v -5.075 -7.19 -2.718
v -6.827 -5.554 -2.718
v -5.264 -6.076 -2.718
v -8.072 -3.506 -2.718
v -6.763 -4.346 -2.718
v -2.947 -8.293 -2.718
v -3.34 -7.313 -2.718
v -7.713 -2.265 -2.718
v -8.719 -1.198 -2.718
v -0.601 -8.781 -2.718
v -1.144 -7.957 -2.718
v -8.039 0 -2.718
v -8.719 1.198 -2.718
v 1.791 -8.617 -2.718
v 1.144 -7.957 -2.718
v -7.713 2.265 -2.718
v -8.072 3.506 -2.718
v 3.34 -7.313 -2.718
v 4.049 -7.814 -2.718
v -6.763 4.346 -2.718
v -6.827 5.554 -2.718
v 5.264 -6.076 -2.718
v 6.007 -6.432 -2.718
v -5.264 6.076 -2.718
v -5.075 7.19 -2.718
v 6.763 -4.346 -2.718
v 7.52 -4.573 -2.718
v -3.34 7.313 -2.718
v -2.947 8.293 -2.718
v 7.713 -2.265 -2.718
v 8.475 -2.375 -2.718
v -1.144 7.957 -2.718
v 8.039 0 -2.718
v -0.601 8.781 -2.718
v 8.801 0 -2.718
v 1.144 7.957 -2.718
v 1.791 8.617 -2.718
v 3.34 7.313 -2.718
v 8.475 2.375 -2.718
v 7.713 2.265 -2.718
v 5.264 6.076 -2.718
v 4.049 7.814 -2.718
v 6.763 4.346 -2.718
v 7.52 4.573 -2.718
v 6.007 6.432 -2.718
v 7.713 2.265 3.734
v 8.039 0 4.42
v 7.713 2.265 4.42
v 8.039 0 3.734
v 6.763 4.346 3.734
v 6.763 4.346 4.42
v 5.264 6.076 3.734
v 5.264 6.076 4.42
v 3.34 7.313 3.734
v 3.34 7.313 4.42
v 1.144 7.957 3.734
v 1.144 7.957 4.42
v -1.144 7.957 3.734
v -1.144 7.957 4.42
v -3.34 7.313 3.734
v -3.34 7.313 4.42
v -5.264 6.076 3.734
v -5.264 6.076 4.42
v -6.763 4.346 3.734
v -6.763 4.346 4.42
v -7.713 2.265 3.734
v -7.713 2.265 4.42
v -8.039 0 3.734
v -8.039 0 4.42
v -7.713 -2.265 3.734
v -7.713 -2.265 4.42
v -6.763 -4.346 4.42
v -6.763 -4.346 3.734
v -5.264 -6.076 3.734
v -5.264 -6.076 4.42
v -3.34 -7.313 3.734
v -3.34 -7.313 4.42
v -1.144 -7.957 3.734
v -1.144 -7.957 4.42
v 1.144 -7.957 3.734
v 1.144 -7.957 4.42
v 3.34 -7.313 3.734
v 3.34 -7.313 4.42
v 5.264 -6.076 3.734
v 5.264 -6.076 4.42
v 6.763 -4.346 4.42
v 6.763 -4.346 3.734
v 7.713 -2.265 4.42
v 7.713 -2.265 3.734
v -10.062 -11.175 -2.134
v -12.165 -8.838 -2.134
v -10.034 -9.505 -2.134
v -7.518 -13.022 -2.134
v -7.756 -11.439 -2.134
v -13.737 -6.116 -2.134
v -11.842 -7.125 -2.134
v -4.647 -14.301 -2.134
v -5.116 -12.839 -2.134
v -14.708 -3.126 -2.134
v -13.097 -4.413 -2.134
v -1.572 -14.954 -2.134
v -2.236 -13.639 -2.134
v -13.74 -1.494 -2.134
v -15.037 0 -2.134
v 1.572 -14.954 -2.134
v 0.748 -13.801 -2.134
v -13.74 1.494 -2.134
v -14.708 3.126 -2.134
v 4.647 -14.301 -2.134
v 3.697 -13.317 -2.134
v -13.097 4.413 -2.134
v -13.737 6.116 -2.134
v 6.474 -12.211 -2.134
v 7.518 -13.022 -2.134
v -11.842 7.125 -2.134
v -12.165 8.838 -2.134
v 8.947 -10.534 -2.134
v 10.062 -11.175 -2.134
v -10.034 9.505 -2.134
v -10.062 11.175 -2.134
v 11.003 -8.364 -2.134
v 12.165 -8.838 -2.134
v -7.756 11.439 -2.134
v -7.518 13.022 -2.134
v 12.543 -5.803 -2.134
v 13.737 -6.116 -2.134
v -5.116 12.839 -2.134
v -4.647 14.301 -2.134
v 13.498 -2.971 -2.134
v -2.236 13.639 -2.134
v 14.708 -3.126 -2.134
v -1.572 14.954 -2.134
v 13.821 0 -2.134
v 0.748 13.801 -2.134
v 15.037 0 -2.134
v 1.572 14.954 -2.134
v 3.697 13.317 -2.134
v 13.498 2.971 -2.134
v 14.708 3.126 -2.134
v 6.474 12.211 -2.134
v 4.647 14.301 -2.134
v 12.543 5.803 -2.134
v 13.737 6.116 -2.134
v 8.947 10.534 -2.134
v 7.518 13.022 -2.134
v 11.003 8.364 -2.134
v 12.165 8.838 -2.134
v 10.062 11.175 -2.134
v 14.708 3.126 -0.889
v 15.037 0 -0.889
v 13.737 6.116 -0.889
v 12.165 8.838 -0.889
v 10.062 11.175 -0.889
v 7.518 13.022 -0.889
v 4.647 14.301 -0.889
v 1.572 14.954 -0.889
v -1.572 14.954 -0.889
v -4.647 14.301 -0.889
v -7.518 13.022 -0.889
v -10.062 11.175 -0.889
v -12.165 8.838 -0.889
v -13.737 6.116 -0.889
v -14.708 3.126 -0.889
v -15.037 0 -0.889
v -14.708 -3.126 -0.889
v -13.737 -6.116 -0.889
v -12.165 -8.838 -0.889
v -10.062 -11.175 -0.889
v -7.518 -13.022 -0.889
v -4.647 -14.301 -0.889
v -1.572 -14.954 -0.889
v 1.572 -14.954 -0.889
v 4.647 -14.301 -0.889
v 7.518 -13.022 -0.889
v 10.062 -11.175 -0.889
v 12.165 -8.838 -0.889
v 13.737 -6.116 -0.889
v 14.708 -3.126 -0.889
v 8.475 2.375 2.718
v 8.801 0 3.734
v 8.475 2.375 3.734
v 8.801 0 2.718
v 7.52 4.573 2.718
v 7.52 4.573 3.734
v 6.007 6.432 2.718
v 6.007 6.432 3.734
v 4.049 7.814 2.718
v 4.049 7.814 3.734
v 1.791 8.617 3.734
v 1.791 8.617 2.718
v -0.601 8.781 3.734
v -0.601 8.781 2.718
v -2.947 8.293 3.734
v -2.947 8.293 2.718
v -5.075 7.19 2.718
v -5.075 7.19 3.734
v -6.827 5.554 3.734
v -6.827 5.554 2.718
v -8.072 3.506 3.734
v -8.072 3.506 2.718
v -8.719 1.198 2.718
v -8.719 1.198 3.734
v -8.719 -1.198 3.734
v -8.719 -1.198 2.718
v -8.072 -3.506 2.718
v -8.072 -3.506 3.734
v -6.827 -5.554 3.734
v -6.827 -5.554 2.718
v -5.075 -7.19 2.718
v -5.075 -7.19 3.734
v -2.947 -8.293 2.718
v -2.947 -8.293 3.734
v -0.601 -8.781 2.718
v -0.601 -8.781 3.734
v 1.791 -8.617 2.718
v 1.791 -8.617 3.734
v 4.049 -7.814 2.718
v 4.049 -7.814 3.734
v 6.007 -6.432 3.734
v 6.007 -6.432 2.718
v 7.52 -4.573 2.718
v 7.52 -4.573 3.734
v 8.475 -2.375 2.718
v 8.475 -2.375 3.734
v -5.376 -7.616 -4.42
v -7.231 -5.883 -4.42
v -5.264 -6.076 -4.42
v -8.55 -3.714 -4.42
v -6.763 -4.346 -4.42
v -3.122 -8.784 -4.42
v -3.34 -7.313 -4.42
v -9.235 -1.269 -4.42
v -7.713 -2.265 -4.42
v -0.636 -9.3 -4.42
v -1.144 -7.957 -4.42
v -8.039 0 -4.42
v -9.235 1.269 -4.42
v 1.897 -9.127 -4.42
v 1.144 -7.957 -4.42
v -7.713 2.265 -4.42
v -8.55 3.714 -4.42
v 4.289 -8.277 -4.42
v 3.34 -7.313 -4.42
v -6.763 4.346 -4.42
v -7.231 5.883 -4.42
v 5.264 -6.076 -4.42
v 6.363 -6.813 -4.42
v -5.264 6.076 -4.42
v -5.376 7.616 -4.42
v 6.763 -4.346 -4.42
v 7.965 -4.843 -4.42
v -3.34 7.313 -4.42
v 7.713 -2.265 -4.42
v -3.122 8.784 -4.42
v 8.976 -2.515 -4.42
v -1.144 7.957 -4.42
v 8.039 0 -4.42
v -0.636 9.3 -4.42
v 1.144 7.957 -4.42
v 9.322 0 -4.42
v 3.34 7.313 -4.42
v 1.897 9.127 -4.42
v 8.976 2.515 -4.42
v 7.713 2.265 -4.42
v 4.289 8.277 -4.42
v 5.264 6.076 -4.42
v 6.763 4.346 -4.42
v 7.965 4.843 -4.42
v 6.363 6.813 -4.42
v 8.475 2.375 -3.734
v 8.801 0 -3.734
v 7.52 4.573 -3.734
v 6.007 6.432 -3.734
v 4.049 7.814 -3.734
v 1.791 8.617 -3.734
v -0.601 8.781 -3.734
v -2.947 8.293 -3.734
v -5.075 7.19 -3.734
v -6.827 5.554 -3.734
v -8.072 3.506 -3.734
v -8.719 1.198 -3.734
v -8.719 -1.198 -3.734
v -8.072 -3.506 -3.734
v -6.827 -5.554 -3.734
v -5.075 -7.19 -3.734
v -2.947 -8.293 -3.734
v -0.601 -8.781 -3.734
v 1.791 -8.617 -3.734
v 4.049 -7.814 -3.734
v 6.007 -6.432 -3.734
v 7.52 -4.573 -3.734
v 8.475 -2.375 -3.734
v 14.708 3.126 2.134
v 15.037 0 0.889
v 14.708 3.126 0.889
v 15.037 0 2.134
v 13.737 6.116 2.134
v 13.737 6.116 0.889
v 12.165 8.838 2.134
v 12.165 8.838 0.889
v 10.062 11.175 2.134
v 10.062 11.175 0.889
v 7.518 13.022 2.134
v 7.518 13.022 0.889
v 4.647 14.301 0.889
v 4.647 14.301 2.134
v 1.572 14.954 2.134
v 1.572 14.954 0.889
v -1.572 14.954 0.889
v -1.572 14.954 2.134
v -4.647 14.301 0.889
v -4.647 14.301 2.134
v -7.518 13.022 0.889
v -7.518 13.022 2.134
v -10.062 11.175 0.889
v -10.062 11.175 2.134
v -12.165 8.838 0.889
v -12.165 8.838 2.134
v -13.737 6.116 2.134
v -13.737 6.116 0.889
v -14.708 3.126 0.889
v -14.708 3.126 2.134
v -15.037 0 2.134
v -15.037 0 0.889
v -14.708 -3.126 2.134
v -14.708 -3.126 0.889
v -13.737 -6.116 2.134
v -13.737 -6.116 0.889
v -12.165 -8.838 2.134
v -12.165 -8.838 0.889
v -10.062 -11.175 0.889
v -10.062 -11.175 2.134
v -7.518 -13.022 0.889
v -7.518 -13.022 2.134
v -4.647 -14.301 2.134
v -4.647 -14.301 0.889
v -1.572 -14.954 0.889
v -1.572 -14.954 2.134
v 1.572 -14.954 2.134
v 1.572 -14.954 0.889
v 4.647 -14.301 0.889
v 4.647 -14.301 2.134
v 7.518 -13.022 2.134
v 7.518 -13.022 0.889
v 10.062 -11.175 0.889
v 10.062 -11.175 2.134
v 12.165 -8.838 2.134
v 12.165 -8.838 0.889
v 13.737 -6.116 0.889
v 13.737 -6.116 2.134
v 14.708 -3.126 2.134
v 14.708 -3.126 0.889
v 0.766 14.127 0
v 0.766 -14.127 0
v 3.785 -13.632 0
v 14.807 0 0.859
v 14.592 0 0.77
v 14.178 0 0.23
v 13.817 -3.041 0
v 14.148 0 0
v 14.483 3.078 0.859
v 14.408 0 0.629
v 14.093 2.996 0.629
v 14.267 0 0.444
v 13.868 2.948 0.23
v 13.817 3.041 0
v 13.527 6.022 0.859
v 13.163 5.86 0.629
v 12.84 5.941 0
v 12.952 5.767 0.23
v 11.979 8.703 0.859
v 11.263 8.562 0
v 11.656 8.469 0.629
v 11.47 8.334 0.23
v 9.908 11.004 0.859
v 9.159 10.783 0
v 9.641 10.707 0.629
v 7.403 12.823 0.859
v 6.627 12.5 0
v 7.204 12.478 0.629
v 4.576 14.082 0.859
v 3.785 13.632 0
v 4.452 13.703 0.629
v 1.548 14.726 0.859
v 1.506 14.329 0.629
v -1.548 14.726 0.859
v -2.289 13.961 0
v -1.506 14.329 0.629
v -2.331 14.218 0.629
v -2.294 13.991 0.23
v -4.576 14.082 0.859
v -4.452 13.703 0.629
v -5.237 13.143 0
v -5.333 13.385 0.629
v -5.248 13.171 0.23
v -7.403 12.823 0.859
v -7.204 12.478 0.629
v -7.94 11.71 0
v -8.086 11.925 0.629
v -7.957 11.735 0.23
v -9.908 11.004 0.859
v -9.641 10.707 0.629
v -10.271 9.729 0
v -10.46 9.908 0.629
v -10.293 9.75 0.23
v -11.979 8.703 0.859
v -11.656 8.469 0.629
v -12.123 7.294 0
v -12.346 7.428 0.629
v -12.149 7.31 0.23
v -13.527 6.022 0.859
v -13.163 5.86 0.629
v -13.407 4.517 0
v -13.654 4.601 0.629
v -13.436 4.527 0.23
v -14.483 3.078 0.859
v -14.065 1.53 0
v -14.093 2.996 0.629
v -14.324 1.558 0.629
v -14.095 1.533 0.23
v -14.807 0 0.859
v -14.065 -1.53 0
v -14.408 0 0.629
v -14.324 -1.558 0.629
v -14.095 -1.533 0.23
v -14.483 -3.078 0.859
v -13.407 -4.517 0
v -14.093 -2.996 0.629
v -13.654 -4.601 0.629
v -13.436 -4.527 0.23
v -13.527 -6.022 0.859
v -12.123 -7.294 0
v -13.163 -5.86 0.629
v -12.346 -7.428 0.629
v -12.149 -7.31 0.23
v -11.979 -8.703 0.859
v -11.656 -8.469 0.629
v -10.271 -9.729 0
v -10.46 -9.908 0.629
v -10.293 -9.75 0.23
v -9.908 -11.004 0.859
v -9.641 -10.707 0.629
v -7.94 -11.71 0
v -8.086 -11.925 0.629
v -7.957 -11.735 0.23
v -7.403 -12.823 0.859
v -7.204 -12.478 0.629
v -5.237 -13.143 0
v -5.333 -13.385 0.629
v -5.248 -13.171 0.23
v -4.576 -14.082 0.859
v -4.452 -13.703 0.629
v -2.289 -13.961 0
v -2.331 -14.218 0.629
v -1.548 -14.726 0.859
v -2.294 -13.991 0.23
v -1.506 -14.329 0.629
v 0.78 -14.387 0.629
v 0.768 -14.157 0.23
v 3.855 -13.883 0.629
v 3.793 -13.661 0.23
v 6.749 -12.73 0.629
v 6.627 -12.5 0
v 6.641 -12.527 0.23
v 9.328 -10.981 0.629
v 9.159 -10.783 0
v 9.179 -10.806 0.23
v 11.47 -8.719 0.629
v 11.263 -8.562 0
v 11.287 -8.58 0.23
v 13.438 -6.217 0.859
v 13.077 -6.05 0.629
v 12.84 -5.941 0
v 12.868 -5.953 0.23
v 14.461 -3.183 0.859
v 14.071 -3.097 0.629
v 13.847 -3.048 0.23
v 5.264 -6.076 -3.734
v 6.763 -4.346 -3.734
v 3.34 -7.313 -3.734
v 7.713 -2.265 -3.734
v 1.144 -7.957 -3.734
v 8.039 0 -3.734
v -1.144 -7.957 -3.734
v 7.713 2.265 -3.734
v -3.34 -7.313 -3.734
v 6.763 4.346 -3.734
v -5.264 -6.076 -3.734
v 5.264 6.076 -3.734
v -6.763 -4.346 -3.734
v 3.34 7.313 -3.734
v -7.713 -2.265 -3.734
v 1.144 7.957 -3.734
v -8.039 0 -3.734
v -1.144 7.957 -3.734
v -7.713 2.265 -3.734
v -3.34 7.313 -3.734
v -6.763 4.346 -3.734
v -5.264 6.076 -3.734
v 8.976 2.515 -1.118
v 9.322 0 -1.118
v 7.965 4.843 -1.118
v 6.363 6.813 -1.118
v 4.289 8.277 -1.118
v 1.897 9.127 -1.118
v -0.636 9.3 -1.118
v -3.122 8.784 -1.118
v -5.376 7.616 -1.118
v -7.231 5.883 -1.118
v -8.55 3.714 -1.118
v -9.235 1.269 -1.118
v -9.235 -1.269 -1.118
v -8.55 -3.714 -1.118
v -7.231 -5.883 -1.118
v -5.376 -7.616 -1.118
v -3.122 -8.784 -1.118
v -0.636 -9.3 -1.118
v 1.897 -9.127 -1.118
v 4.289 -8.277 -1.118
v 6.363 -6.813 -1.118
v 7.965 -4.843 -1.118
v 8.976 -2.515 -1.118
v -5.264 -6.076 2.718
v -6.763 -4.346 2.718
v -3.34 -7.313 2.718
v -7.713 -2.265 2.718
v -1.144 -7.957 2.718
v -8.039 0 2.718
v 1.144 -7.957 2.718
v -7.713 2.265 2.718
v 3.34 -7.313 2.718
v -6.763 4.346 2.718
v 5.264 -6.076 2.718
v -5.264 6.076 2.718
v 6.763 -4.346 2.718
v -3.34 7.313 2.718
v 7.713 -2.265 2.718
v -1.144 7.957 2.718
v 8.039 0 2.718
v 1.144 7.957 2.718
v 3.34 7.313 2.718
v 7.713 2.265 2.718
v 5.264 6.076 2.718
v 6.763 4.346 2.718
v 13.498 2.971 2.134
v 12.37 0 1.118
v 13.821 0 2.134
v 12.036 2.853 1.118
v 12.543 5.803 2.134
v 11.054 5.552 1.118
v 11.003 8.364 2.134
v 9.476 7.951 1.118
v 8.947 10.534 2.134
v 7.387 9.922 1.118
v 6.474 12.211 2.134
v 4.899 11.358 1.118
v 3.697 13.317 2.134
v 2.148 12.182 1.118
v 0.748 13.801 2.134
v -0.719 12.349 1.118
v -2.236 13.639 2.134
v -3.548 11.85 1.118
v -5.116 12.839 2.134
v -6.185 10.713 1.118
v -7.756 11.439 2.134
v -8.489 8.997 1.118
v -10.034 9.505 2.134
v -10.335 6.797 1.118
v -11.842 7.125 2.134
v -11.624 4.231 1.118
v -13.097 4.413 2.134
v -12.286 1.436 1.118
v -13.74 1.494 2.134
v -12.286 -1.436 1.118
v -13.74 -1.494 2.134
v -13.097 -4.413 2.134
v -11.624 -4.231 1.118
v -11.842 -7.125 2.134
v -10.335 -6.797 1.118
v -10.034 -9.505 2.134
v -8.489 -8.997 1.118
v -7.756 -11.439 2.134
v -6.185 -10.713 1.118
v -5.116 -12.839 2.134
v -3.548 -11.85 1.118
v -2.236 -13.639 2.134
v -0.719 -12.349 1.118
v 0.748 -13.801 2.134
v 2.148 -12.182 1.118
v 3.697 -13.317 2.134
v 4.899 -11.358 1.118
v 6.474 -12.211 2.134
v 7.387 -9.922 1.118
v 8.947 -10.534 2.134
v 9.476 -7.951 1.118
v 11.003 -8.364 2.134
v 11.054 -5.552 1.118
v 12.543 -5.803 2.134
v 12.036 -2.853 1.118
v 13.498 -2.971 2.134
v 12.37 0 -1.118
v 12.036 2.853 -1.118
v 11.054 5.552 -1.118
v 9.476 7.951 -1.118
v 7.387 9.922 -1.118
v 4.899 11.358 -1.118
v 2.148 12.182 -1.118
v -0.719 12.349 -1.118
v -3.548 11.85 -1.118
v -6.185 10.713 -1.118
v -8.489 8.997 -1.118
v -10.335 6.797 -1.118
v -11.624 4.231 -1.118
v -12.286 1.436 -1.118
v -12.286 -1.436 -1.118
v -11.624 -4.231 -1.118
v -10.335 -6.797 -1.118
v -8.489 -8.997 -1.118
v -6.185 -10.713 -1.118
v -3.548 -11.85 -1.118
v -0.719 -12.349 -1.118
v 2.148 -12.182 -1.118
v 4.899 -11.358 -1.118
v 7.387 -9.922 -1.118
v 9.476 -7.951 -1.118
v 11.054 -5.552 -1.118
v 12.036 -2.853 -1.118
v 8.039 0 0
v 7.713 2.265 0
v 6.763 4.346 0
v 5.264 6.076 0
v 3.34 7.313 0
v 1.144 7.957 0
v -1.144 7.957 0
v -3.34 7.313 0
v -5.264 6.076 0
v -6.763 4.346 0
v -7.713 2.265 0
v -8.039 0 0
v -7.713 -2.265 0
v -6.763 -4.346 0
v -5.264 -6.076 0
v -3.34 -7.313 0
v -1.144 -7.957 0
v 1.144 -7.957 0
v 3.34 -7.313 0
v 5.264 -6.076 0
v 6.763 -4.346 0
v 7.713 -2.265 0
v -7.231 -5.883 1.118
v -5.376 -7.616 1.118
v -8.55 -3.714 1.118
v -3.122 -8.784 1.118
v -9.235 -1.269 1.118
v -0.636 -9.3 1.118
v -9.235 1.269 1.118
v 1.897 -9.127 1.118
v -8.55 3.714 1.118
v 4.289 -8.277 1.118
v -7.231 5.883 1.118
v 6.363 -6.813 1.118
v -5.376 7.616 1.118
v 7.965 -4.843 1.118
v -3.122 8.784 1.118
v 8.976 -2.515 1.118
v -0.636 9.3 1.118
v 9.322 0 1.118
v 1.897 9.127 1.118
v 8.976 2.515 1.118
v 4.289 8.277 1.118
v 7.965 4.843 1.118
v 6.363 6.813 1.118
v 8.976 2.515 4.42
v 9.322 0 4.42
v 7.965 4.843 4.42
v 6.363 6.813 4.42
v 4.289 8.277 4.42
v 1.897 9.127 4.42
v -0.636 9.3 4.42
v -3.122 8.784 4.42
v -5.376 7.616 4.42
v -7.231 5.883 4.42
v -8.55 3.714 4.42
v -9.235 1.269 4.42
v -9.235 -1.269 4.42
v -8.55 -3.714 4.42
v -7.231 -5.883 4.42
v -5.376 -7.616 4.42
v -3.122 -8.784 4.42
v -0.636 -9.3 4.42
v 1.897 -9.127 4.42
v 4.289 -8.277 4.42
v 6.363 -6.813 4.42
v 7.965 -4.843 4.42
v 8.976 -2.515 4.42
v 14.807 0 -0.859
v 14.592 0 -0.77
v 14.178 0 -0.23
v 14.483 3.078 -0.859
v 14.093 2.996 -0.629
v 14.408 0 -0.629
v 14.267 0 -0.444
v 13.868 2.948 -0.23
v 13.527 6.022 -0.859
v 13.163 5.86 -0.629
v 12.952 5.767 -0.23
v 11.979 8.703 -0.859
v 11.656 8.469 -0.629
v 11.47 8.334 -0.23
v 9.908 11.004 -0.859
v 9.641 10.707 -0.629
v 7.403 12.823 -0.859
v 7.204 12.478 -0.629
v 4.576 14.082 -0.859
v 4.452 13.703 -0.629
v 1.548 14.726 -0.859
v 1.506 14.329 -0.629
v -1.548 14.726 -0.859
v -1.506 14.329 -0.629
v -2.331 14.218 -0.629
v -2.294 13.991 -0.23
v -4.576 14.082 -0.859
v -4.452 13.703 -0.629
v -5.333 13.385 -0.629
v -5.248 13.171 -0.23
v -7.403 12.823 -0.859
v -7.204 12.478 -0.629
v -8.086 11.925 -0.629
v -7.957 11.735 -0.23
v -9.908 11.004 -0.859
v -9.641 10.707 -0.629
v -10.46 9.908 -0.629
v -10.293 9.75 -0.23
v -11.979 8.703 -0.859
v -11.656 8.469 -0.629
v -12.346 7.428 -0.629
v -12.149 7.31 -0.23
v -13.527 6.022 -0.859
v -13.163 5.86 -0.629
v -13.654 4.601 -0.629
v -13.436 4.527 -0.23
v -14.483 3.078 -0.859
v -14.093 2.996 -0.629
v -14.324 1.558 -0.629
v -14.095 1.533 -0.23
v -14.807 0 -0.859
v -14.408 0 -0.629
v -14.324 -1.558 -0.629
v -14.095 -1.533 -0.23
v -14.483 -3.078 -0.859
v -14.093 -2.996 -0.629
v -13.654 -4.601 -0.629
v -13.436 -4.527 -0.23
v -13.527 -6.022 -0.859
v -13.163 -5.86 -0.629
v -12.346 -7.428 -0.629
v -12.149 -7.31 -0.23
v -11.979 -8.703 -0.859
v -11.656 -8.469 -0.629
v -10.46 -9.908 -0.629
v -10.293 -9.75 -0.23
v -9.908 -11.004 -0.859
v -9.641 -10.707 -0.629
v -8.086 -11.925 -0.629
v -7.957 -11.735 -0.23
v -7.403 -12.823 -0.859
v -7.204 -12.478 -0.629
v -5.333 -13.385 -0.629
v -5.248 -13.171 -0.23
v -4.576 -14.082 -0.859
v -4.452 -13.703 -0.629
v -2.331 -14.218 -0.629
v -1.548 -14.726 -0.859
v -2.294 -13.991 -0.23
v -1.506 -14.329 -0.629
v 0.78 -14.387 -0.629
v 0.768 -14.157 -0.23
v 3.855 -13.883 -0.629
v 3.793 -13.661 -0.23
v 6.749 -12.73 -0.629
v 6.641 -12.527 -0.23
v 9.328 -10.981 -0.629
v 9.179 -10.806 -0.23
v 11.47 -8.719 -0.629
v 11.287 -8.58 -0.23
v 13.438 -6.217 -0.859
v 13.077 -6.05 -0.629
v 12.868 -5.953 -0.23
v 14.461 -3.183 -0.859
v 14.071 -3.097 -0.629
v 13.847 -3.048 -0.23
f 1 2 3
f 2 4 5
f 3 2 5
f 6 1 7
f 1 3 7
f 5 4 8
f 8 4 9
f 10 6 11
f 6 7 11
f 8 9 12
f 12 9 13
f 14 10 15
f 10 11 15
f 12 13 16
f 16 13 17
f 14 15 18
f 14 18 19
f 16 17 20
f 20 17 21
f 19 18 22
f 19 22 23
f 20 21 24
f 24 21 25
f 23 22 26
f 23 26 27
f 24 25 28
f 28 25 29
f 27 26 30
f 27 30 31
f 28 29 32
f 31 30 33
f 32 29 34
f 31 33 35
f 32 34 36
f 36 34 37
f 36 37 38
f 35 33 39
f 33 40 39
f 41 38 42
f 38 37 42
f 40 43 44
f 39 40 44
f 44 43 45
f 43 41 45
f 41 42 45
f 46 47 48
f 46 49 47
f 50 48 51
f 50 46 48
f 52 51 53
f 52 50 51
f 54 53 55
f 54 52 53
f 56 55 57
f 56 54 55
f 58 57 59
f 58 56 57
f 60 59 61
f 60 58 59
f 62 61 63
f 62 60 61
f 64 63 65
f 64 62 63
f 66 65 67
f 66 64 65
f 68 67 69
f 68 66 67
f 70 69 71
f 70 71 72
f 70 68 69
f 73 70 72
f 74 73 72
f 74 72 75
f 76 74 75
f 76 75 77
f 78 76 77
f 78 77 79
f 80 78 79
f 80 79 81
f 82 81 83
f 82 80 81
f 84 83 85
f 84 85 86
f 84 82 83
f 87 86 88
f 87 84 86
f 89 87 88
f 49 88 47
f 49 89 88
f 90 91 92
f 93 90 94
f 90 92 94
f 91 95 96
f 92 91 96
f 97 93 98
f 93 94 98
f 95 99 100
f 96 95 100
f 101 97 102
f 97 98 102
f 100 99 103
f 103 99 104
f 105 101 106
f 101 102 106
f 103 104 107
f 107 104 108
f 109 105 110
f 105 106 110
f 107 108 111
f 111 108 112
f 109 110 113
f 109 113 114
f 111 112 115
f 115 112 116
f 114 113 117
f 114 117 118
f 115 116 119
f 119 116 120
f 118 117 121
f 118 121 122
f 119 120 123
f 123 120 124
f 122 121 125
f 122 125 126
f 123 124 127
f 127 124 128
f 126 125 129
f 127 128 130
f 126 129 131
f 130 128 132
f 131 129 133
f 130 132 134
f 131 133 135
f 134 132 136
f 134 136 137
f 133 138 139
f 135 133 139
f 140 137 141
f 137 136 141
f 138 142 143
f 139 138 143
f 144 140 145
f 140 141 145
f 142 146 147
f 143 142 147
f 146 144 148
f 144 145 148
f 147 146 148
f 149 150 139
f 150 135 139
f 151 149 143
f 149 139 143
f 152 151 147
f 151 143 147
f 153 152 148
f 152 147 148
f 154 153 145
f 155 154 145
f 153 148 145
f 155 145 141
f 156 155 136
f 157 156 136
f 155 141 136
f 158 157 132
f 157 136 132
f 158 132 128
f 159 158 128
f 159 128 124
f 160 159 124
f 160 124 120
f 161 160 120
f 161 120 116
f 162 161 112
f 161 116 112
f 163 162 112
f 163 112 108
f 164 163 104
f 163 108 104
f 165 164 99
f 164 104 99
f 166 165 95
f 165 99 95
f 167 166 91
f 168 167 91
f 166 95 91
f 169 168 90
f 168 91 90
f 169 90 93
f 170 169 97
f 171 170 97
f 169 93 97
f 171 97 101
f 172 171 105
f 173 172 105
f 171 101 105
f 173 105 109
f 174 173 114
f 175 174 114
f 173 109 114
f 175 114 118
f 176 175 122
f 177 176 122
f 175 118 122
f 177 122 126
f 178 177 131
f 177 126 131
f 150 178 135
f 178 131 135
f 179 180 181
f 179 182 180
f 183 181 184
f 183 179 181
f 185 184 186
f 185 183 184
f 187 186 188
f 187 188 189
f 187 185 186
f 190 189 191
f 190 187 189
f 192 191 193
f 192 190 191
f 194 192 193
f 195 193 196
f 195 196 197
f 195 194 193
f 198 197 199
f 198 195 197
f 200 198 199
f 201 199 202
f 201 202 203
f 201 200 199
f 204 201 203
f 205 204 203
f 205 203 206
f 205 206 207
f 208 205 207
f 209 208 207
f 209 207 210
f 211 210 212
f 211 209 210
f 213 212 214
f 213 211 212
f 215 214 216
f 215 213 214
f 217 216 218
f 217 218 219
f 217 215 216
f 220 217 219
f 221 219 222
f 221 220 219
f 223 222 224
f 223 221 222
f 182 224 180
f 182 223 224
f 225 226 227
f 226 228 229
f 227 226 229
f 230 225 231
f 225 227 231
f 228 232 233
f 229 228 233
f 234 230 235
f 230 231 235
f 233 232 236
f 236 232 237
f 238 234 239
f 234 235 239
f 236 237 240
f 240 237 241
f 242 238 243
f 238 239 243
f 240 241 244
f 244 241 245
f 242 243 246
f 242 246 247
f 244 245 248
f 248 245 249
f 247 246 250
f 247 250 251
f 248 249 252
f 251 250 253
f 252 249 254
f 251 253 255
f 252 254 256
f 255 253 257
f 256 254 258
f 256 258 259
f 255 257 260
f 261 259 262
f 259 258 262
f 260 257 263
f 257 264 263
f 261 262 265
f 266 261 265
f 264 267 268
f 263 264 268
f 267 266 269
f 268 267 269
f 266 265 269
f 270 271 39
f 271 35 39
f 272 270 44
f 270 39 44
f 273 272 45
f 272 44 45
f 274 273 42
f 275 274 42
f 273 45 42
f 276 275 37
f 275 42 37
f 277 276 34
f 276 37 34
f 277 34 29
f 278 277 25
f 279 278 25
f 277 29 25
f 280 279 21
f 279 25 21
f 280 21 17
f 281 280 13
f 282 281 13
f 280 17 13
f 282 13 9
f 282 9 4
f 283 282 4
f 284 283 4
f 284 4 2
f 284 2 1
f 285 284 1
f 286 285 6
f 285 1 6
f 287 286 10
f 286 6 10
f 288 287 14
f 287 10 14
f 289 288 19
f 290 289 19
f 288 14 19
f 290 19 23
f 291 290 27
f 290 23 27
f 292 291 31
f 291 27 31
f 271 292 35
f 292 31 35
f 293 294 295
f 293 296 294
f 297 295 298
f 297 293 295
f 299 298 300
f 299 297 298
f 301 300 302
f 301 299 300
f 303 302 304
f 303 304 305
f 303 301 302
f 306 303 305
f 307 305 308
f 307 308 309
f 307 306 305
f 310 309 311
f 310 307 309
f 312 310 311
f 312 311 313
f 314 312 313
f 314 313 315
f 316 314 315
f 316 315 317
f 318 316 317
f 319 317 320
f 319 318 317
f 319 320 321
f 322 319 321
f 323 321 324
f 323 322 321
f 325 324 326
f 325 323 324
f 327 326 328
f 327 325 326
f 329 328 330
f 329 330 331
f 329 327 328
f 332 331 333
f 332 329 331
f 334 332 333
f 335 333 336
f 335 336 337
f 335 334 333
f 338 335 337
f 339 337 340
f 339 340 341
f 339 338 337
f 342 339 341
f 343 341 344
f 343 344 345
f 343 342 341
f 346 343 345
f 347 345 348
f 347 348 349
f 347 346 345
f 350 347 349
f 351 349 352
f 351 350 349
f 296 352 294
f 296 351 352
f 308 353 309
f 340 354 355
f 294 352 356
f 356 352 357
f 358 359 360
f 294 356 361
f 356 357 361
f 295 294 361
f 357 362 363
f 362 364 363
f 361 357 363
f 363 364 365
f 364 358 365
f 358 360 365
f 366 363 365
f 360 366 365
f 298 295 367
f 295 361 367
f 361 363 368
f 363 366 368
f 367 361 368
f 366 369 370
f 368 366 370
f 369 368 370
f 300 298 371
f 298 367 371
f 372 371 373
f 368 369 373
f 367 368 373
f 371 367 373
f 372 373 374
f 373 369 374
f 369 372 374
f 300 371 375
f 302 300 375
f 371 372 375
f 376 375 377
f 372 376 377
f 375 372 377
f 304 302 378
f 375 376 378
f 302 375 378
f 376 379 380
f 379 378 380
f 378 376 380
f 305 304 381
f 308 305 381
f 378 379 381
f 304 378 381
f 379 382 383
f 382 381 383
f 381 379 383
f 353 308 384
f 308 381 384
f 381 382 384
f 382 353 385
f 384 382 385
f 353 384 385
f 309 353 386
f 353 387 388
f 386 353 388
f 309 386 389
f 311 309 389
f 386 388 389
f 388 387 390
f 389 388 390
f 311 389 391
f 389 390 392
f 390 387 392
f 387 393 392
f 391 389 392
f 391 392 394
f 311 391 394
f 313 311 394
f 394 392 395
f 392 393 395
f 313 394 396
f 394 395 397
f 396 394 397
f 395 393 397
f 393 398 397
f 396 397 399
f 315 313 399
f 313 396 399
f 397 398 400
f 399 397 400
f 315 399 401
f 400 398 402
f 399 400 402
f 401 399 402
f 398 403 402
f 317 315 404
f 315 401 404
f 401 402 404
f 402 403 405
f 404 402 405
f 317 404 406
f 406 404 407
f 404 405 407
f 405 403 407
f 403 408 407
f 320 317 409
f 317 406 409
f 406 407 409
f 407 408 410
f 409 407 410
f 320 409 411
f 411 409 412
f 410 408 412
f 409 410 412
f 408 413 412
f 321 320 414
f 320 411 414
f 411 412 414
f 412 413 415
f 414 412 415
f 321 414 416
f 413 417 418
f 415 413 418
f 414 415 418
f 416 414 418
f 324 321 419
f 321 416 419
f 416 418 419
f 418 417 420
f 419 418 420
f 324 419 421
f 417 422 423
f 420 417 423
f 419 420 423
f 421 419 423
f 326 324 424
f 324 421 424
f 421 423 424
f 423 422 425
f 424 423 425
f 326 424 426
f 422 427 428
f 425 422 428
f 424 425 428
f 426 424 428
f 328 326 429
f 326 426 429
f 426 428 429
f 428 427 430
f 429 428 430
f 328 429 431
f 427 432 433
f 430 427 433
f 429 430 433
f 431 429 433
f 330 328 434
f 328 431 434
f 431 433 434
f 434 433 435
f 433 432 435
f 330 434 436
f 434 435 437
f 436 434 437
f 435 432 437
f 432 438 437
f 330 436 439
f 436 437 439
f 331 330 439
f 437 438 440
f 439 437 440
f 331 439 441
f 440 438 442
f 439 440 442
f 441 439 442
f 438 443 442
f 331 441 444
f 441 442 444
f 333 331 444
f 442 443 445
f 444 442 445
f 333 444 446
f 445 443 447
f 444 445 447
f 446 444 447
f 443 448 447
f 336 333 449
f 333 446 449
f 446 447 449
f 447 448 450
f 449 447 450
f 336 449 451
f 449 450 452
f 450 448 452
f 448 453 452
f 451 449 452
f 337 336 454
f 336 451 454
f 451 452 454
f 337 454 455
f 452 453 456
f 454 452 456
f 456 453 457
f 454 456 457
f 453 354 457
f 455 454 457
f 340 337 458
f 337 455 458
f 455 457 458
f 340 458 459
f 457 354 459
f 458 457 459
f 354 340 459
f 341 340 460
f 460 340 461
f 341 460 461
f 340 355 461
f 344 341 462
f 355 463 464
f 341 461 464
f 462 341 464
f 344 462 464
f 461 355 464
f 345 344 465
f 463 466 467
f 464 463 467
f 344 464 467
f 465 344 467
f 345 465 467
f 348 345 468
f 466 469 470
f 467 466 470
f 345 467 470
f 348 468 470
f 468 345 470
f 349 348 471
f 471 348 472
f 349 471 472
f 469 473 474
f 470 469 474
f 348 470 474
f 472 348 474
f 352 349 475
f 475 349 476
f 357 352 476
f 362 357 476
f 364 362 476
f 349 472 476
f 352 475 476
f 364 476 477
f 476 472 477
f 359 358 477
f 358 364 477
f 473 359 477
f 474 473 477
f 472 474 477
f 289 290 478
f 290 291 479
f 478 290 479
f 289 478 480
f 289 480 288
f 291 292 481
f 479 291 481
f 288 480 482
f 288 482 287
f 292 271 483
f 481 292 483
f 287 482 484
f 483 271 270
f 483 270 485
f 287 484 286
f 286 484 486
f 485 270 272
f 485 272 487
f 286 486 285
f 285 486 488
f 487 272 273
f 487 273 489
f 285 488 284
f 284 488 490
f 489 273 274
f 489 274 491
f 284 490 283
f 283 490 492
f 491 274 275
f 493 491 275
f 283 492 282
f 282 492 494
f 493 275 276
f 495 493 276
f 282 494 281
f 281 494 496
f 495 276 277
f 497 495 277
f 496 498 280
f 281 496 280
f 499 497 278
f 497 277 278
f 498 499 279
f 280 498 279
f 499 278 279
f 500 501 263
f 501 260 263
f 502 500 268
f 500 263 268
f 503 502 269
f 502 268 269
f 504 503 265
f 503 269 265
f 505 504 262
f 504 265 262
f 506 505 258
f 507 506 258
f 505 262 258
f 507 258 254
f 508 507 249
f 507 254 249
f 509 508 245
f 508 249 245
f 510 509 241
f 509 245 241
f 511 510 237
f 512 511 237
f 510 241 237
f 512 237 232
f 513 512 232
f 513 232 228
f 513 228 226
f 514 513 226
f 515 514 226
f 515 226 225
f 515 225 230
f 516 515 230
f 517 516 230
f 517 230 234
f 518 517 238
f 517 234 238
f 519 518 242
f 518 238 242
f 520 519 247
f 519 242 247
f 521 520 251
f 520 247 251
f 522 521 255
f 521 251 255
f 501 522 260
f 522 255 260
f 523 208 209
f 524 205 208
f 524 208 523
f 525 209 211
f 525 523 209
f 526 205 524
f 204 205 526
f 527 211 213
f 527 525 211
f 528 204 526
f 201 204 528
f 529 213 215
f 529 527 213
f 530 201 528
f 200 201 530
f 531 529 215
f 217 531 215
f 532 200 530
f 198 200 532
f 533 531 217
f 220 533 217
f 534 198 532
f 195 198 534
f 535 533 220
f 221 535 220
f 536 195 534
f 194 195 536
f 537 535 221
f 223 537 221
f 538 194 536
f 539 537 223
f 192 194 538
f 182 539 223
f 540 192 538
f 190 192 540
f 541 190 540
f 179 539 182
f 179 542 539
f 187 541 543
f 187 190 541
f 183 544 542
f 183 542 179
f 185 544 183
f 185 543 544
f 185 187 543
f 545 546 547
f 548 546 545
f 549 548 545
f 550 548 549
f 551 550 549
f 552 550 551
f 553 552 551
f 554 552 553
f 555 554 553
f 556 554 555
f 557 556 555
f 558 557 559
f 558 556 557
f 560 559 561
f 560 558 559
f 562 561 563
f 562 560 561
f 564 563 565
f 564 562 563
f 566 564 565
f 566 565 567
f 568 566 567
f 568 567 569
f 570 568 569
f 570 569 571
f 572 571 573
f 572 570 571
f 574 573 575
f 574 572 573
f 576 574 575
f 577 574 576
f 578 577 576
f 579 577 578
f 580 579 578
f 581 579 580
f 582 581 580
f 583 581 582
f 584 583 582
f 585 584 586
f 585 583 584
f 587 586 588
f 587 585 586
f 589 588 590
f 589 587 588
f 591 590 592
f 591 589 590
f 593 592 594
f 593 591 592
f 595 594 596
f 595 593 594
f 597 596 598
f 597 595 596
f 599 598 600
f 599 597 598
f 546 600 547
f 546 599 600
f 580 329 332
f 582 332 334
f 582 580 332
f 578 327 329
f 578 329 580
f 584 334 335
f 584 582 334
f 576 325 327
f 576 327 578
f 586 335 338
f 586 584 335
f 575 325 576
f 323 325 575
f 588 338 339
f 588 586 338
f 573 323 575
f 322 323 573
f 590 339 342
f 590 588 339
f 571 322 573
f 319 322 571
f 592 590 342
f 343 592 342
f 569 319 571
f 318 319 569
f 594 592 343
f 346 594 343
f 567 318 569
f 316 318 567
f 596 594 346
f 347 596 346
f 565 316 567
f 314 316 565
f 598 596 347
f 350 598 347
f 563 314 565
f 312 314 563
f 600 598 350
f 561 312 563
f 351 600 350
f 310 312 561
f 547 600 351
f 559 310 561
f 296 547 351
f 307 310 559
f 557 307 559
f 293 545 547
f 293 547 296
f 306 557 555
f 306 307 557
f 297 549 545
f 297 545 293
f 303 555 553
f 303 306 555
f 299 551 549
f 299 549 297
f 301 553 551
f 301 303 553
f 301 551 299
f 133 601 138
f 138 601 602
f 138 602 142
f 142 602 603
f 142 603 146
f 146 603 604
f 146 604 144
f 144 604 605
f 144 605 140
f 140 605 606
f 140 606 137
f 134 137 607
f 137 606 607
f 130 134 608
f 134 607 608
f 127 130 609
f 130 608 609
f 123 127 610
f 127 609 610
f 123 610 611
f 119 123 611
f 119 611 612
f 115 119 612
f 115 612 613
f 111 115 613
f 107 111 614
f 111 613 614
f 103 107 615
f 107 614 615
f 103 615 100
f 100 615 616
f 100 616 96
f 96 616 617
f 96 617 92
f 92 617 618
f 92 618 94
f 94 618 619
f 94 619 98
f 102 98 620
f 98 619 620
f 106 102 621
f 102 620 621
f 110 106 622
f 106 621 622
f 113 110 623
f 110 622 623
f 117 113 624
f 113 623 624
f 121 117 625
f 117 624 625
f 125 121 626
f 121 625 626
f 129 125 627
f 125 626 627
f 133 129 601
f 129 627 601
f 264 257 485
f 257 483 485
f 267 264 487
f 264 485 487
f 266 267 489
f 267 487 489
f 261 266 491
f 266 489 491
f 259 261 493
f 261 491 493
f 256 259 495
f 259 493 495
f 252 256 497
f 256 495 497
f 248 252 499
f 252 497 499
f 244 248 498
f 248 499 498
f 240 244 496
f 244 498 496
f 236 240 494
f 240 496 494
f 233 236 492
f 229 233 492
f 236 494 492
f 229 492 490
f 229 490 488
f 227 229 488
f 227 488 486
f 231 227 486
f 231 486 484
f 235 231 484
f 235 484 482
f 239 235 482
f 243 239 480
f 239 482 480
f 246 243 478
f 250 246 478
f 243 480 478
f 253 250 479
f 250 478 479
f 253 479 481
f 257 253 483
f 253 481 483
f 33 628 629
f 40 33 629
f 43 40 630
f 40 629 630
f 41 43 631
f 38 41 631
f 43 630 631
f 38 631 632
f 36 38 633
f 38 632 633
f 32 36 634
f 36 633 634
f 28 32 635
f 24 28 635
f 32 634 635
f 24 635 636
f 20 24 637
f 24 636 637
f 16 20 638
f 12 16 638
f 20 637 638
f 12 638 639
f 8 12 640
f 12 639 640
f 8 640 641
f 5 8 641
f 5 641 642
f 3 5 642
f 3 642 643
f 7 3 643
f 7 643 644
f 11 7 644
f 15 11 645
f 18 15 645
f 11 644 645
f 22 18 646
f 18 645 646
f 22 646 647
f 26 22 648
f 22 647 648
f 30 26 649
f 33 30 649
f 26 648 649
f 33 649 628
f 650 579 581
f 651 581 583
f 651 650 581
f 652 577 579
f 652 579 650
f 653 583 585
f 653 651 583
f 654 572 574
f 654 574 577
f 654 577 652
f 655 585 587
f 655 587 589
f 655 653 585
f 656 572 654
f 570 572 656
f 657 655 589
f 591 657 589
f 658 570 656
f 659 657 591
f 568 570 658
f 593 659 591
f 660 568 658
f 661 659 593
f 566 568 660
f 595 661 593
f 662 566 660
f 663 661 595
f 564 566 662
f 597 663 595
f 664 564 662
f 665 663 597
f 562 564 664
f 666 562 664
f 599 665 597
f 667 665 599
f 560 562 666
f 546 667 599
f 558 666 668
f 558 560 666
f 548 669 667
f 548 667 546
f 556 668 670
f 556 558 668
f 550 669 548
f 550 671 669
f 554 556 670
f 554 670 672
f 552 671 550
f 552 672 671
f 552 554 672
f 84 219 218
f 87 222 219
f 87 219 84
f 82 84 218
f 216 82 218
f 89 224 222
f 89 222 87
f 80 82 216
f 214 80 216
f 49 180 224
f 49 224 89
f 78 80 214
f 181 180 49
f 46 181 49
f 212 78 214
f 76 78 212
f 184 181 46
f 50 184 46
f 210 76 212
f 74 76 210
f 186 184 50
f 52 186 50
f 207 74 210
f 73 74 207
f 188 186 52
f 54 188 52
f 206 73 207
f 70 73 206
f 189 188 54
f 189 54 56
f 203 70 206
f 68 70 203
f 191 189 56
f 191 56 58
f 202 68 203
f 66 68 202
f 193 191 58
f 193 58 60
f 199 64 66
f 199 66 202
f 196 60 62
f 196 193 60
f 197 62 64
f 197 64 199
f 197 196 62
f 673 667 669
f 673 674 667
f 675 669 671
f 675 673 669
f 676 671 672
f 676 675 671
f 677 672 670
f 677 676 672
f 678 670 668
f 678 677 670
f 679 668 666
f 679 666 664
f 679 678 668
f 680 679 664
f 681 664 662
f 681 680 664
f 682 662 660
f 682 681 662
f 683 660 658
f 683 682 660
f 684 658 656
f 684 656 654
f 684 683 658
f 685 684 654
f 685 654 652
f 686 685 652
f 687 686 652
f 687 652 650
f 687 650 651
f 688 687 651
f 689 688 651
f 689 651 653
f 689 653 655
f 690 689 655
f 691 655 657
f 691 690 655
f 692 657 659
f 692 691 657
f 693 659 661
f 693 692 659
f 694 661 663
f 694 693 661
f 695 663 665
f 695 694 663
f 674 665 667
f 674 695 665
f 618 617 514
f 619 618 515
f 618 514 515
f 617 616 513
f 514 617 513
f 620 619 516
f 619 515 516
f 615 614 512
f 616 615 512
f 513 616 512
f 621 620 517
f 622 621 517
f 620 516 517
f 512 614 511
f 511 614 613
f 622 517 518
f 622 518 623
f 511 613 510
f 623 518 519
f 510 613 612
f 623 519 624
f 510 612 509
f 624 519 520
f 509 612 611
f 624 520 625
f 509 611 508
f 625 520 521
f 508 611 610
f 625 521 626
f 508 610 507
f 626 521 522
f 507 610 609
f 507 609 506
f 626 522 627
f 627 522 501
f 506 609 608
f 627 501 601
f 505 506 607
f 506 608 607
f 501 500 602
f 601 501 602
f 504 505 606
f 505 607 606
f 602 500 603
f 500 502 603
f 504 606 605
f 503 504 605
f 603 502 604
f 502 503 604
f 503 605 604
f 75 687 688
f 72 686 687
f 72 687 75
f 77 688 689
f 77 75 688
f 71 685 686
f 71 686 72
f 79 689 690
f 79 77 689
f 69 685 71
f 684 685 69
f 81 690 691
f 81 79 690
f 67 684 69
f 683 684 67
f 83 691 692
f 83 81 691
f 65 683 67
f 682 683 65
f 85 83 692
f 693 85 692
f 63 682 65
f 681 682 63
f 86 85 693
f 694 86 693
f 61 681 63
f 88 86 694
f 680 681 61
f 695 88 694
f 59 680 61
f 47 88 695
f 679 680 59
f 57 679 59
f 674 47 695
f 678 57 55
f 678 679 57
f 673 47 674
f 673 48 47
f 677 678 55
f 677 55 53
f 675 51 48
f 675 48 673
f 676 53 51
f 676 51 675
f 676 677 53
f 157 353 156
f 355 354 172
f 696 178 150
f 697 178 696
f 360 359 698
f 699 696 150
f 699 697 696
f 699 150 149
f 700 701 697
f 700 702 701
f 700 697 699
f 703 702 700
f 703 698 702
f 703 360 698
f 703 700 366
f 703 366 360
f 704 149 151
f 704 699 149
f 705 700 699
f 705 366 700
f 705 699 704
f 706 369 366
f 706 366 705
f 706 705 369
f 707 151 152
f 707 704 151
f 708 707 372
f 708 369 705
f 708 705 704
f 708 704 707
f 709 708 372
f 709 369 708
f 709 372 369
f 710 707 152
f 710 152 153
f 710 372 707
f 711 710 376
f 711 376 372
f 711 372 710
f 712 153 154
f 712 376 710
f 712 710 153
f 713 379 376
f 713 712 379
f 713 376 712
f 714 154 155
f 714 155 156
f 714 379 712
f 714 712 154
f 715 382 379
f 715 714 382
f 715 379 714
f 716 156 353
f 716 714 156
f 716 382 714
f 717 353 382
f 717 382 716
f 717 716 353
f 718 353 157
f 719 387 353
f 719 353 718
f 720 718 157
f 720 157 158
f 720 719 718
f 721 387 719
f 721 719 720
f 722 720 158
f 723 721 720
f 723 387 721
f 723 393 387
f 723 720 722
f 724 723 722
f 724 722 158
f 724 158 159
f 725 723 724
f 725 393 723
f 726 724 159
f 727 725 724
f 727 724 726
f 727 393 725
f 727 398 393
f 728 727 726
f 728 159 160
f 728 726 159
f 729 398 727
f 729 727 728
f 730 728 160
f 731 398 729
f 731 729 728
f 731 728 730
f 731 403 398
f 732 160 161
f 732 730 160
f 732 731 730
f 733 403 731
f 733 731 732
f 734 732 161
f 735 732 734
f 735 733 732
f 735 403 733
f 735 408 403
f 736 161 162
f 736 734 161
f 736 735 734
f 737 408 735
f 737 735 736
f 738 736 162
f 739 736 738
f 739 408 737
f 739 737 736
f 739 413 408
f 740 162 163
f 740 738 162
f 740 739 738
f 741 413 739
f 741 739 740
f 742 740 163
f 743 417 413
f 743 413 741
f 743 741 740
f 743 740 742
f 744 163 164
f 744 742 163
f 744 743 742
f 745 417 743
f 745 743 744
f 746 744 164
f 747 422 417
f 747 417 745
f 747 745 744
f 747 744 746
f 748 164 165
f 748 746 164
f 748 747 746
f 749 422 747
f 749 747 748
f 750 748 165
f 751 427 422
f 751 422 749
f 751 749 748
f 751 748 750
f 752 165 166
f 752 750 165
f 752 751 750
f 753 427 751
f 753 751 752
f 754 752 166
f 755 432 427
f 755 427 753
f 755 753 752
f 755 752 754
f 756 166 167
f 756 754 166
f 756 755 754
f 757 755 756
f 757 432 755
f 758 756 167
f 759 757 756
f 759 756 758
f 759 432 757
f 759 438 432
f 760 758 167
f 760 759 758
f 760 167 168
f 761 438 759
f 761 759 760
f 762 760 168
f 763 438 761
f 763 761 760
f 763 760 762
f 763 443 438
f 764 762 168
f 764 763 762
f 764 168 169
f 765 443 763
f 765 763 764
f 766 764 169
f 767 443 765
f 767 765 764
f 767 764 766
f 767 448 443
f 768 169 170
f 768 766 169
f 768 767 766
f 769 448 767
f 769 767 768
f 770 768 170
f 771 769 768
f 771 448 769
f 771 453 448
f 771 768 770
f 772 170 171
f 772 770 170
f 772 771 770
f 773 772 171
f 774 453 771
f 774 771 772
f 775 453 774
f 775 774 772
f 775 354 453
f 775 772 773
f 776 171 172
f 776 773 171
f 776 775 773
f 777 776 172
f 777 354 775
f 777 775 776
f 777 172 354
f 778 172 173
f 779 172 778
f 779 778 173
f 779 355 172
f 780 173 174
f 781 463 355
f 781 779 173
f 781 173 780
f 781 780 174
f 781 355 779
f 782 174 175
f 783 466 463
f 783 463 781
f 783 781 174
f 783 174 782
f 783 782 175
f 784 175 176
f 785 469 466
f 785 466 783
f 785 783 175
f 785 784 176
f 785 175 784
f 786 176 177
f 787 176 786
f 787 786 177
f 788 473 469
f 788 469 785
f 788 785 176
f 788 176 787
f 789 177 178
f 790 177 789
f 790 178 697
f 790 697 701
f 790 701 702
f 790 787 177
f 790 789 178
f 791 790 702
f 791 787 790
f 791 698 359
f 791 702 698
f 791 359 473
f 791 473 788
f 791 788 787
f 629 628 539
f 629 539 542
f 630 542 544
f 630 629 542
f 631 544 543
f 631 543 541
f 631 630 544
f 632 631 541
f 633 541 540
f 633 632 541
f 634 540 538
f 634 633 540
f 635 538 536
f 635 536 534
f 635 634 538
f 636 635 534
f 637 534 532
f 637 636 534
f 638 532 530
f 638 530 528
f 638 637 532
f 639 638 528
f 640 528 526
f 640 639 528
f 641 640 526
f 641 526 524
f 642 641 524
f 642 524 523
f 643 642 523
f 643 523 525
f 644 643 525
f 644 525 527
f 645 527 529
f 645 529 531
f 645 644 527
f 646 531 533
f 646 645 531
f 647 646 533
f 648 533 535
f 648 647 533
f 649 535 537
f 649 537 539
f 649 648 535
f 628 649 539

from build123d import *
from build123d import SkipClean  # not in build123d's __all__

# Parameters (mm, degrees)
F2_R = 0.889


with BuildPart() as f1:
    # F0 (on Front) → F1 (revolve)
    with BuildSketch(Plane.XZ):
        Polygon((8.0391, 2.7178), (8.0391, 0), (15.0368, 0), (15.0368, 2.1336), (13.8207983748, 2.1336), (12.3698, 1.1176), (9.3218, 1.1176), (9.3218, 4.4196), (8.0391, 4.4196), (8.0391, 3.7338), (8.8011, 3.7338), (8.8011, 2.7178), align=None)
    revolve(axis=Axis((0, 0, 19.8358264327), (0, 0, 1)))

    # F2 (on Front) → F3 (revolve, cut)
    with BuildSketch(Plane.XZ):
        with Locations((15.0368, 0)):
            Circle(F2_R)
    revolve(axis=Axis((0, 0, 19.8358264327), (0, 0, 1)), mode=Mode.SUBTRACT)

    # F4: F1 across plane


with BuildPart() as f1_1:
    add(f1.part, clean=False)
    with SkipClean():  # cleaning this boolean's faces spoils the solid; the shape is the same uncleaned
        add(f1.part.mirror(Plane.XY), clean=False)


solid = f1_1.part
